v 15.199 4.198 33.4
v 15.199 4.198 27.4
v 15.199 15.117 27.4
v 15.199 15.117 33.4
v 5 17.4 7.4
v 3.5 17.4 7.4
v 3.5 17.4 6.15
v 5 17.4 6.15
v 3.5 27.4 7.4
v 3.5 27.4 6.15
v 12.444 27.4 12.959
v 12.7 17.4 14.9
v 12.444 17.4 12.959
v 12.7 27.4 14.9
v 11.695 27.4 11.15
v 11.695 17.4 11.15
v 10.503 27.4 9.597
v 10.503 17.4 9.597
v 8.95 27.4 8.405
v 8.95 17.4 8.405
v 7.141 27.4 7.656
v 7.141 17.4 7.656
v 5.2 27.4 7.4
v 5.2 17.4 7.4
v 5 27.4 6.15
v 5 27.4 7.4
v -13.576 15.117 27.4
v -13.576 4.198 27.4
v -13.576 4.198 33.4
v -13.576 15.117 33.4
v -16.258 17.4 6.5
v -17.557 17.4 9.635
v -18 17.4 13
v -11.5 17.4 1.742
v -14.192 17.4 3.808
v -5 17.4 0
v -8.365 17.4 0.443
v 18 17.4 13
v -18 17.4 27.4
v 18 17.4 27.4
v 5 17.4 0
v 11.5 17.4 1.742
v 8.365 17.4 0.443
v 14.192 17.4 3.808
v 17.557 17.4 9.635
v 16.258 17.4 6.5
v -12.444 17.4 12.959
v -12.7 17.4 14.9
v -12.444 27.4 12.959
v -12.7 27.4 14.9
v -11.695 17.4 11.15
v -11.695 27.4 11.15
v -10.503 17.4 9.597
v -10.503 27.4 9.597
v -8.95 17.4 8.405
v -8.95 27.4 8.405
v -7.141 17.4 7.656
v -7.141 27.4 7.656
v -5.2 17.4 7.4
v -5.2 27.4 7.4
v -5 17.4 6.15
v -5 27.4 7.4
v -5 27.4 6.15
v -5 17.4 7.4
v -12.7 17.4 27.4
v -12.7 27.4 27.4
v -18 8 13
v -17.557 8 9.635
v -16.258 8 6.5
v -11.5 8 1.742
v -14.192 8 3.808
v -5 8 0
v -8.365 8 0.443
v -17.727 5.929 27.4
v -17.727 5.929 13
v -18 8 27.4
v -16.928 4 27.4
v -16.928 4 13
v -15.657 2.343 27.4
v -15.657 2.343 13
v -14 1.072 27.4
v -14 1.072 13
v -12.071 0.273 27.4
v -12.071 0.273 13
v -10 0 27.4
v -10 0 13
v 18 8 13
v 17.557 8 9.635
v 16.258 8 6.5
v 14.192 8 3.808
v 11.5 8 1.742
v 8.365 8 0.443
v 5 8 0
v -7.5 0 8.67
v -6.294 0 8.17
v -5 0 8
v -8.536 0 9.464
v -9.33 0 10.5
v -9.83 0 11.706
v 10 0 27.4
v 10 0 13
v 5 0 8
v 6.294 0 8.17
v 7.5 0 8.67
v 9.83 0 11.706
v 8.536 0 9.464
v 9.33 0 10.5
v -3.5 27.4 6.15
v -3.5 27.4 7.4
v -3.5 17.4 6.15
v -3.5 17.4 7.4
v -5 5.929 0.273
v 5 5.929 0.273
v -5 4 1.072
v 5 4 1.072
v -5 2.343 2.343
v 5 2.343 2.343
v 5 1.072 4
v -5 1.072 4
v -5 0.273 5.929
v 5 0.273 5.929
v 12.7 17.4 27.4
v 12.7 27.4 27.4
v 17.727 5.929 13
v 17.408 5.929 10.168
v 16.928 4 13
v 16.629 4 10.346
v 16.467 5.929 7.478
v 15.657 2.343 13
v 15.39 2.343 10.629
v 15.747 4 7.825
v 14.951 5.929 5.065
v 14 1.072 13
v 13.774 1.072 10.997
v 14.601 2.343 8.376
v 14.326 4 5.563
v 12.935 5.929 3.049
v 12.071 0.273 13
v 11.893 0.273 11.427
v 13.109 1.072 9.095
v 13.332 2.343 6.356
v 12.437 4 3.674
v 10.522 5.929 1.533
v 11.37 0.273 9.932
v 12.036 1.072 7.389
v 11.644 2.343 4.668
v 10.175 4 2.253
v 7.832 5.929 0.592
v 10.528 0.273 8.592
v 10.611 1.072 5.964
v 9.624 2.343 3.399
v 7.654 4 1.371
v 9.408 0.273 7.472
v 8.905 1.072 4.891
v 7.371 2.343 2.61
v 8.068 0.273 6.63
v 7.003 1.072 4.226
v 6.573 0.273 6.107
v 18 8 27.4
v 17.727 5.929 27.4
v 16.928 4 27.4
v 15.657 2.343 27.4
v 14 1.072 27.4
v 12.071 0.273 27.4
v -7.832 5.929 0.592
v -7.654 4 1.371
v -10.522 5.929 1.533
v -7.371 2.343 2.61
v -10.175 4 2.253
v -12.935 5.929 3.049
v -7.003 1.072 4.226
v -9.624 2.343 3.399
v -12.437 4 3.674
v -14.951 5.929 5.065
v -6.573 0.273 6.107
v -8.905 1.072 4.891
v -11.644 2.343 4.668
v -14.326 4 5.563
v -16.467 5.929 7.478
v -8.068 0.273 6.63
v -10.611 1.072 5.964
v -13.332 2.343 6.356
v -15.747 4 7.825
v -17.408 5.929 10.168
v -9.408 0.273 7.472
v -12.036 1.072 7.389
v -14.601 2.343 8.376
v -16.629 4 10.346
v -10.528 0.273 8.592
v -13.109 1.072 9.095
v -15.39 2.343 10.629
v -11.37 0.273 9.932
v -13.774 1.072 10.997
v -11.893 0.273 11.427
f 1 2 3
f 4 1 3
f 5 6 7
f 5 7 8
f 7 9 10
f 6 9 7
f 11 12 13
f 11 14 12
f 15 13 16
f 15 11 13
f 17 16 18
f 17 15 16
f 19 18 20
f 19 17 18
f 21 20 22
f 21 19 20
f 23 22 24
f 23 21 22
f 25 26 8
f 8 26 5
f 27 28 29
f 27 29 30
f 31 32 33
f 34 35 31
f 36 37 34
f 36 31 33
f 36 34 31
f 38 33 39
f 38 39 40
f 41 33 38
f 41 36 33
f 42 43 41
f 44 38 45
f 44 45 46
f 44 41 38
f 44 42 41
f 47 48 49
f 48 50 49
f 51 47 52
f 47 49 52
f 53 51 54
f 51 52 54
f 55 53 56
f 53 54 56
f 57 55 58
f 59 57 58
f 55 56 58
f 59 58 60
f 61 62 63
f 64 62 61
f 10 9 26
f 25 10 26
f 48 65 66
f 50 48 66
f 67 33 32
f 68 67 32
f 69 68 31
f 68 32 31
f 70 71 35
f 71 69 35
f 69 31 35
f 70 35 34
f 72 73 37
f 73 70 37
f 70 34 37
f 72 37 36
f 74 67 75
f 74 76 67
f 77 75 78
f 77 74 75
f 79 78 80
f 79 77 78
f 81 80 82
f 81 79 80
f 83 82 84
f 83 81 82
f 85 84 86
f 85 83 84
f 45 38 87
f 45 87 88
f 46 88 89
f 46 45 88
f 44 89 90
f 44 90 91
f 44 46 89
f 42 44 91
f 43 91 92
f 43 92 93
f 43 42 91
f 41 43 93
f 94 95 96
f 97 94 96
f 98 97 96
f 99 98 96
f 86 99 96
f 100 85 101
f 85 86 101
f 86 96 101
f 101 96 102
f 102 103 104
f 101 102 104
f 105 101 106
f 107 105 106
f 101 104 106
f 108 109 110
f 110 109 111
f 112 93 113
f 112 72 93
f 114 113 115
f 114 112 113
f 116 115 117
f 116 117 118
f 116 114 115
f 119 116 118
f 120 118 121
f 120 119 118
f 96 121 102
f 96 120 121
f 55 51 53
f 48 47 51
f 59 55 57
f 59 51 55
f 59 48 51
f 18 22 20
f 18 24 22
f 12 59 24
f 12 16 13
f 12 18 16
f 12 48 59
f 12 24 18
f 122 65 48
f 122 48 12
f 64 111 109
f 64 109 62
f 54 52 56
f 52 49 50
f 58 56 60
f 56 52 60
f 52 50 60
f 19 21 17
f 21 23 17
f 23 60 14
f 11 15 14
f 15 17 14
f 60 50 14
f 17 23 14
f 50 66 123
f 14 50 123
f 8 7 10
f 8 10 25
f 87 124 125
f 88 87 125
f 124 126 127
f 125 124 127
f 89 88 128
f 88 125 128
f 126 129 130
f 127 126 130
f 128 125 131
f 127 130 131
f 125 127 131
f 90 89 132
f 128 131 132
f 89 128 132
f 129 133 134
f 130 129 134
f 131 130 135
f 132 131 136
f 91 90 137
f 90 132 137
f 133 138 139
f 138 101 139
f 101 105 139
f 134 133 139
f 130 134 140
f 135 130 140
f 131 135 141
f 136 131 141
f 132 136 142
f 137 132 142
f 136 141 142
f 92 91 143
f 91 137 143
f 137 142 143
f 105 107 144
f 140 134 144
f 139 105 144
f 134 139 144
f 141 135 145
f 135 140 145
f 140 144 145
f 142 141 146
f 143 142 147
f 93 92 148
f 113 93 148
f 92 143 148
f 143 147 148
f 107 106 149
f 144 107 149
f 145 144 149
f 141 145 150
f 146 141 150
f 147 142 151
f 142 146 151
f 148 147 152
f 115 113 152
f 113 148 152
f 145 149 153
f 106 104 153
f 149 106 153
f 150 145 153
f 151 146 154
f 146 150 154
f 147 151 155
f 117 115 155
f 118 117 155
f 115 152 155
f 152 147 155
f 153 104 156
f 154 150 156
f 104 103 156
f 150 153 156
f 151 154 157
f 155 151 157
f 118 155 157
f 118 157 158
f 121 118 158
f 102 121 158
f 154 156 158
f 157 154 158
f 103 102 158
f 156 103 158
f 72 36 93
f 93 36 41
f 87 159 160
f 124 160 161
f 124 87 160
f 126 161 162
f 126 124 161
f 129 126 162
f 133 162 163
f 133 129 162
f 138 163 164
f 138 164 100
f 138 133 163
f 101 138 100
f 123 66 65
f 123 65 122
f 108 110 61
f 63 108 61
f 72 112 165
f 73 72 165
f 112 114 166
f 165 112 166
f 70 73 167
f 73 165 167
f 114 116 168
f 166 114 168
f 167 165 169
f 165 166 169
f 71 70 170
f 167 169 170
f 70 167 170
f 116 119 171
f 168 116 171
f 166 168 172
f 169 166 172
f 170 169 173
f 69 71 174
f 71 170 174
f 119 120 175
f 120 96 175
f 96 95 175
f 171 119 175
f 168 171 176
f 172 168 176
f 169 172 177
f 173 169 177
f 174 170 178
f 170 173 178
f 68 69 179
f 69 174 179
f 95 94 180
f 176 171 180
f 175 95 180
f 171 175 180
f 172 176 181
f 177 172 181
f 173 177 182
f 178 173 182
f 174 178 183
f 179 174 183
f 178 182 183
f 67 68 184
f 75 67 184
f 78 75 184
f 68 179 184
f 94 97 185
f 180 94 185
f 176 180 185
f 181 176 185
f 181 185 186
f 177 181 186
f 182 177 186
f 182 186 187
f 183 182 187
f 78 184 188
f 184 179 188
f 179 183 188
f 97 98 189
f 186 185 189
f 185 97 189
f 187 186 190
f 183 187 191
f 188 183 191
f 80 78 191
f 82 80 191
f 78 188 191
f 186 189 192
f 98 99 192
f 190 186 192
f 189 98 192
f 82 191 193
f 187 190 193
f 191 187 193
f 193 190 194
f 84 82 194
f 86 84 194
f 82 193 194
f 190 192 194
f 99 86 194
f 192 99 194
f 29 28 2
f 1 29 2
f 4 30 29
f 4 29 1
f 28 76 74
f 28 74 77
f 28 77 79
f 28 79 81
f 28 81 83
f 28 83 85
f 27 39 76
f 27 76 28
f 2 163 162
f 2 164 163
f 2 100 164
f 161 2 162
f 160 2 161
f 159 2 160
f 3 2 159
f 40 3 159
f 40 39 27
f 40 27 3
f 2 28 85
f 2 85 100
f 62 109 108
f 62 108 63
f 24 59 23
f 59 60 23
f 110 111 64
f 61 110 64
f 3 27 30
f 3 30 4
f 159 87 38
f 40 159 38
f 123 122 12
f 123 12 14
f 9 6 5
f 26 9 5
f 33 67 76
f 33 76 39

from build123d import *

# Parameters (mm, degrees)
F0_W      = 36
F0_H      = 17.4
F1_DEPTH  = 27.4
F2_W      = 25.4
F2_H      = 10
F3_DEPTH  = 20
F4_R      = 7.5
F5_R      = 13
F6_W      = 28.7746842951
F6_H      = 10.9196235426
F7_DEPTH  = 6
F8_R      = 8
F9_W      = 1.5
F9_H      = 10
F10_DEPTH = 1.25


with BuildPart() as f1:
    # F0 (on Top) → F1 (new body)
    with BuildSketch(Plane.XY):
        with Locations((0, 8.7)):
            Rectangle(F0_W, F0_H)
    extrude(amount=F1_DEPTH)

    # F5
    f5_edges = [f1.edges().sort_by_distance(p)[0] for p in [
        (18, 8.7, 0),
        (-18, 8.7, 0),
    ]]
    fillet(f5_edges, radius=F5_R)

    # F6 (on face) → F7 (join)
    with BuildSketch(Plane.XY.offset(27.4)):
        with Locations((0.811596401, 9.6576230135)):
            Rectangle(F6_W, F6_H)
    extrude(amount=F7_DEPTH)

    # F8
    f8_edges = [f1.edges().sort_by_distance(p)[0] for p in [
        (-18, 0, 20.2),
        (-14.192388, 0, 3.807612),
    ]]
    fillet(f8_edges, radius=F8_R)


with BuildPart() as f3:
    # F2 (on face) → F3 (new body)
    with BuildSketch(Plane.XY.offset(27.4)):
        with Locations((0, 22.4)):
            Rectangle(F2_W, F2_H)
    extrude(amount=-F3_DEPTH)

    # F4
    f4_edges = [f3.edges().sort_by_distance(p)[0] for p in [
        (-12.7, 22.4, 7.4),
        (12.7, 22.4, 7.4),
    ]]
    fillet(f4_edges, radius=F4_R)


with BuildPart() as f10:
    # F9 (on face) → F10 (new body)
    with BuildSketch(Plane(origin=(0, 0, 7.4), x_dir=(1, 0, 0), z_dir=(0, 0, -1))):
        with Locations((4.25, -22.4)):
            Rectangle(F9_W, F9_H)
    extrude(amount=F10_DEPTH)


with BuildPart() as f11_1:
    # F11: instance of F10
    add(f10.part.mirror(Plane.YZ))


solid = Compound([f1.part, f3.part, f10.part, f11_1.part])
